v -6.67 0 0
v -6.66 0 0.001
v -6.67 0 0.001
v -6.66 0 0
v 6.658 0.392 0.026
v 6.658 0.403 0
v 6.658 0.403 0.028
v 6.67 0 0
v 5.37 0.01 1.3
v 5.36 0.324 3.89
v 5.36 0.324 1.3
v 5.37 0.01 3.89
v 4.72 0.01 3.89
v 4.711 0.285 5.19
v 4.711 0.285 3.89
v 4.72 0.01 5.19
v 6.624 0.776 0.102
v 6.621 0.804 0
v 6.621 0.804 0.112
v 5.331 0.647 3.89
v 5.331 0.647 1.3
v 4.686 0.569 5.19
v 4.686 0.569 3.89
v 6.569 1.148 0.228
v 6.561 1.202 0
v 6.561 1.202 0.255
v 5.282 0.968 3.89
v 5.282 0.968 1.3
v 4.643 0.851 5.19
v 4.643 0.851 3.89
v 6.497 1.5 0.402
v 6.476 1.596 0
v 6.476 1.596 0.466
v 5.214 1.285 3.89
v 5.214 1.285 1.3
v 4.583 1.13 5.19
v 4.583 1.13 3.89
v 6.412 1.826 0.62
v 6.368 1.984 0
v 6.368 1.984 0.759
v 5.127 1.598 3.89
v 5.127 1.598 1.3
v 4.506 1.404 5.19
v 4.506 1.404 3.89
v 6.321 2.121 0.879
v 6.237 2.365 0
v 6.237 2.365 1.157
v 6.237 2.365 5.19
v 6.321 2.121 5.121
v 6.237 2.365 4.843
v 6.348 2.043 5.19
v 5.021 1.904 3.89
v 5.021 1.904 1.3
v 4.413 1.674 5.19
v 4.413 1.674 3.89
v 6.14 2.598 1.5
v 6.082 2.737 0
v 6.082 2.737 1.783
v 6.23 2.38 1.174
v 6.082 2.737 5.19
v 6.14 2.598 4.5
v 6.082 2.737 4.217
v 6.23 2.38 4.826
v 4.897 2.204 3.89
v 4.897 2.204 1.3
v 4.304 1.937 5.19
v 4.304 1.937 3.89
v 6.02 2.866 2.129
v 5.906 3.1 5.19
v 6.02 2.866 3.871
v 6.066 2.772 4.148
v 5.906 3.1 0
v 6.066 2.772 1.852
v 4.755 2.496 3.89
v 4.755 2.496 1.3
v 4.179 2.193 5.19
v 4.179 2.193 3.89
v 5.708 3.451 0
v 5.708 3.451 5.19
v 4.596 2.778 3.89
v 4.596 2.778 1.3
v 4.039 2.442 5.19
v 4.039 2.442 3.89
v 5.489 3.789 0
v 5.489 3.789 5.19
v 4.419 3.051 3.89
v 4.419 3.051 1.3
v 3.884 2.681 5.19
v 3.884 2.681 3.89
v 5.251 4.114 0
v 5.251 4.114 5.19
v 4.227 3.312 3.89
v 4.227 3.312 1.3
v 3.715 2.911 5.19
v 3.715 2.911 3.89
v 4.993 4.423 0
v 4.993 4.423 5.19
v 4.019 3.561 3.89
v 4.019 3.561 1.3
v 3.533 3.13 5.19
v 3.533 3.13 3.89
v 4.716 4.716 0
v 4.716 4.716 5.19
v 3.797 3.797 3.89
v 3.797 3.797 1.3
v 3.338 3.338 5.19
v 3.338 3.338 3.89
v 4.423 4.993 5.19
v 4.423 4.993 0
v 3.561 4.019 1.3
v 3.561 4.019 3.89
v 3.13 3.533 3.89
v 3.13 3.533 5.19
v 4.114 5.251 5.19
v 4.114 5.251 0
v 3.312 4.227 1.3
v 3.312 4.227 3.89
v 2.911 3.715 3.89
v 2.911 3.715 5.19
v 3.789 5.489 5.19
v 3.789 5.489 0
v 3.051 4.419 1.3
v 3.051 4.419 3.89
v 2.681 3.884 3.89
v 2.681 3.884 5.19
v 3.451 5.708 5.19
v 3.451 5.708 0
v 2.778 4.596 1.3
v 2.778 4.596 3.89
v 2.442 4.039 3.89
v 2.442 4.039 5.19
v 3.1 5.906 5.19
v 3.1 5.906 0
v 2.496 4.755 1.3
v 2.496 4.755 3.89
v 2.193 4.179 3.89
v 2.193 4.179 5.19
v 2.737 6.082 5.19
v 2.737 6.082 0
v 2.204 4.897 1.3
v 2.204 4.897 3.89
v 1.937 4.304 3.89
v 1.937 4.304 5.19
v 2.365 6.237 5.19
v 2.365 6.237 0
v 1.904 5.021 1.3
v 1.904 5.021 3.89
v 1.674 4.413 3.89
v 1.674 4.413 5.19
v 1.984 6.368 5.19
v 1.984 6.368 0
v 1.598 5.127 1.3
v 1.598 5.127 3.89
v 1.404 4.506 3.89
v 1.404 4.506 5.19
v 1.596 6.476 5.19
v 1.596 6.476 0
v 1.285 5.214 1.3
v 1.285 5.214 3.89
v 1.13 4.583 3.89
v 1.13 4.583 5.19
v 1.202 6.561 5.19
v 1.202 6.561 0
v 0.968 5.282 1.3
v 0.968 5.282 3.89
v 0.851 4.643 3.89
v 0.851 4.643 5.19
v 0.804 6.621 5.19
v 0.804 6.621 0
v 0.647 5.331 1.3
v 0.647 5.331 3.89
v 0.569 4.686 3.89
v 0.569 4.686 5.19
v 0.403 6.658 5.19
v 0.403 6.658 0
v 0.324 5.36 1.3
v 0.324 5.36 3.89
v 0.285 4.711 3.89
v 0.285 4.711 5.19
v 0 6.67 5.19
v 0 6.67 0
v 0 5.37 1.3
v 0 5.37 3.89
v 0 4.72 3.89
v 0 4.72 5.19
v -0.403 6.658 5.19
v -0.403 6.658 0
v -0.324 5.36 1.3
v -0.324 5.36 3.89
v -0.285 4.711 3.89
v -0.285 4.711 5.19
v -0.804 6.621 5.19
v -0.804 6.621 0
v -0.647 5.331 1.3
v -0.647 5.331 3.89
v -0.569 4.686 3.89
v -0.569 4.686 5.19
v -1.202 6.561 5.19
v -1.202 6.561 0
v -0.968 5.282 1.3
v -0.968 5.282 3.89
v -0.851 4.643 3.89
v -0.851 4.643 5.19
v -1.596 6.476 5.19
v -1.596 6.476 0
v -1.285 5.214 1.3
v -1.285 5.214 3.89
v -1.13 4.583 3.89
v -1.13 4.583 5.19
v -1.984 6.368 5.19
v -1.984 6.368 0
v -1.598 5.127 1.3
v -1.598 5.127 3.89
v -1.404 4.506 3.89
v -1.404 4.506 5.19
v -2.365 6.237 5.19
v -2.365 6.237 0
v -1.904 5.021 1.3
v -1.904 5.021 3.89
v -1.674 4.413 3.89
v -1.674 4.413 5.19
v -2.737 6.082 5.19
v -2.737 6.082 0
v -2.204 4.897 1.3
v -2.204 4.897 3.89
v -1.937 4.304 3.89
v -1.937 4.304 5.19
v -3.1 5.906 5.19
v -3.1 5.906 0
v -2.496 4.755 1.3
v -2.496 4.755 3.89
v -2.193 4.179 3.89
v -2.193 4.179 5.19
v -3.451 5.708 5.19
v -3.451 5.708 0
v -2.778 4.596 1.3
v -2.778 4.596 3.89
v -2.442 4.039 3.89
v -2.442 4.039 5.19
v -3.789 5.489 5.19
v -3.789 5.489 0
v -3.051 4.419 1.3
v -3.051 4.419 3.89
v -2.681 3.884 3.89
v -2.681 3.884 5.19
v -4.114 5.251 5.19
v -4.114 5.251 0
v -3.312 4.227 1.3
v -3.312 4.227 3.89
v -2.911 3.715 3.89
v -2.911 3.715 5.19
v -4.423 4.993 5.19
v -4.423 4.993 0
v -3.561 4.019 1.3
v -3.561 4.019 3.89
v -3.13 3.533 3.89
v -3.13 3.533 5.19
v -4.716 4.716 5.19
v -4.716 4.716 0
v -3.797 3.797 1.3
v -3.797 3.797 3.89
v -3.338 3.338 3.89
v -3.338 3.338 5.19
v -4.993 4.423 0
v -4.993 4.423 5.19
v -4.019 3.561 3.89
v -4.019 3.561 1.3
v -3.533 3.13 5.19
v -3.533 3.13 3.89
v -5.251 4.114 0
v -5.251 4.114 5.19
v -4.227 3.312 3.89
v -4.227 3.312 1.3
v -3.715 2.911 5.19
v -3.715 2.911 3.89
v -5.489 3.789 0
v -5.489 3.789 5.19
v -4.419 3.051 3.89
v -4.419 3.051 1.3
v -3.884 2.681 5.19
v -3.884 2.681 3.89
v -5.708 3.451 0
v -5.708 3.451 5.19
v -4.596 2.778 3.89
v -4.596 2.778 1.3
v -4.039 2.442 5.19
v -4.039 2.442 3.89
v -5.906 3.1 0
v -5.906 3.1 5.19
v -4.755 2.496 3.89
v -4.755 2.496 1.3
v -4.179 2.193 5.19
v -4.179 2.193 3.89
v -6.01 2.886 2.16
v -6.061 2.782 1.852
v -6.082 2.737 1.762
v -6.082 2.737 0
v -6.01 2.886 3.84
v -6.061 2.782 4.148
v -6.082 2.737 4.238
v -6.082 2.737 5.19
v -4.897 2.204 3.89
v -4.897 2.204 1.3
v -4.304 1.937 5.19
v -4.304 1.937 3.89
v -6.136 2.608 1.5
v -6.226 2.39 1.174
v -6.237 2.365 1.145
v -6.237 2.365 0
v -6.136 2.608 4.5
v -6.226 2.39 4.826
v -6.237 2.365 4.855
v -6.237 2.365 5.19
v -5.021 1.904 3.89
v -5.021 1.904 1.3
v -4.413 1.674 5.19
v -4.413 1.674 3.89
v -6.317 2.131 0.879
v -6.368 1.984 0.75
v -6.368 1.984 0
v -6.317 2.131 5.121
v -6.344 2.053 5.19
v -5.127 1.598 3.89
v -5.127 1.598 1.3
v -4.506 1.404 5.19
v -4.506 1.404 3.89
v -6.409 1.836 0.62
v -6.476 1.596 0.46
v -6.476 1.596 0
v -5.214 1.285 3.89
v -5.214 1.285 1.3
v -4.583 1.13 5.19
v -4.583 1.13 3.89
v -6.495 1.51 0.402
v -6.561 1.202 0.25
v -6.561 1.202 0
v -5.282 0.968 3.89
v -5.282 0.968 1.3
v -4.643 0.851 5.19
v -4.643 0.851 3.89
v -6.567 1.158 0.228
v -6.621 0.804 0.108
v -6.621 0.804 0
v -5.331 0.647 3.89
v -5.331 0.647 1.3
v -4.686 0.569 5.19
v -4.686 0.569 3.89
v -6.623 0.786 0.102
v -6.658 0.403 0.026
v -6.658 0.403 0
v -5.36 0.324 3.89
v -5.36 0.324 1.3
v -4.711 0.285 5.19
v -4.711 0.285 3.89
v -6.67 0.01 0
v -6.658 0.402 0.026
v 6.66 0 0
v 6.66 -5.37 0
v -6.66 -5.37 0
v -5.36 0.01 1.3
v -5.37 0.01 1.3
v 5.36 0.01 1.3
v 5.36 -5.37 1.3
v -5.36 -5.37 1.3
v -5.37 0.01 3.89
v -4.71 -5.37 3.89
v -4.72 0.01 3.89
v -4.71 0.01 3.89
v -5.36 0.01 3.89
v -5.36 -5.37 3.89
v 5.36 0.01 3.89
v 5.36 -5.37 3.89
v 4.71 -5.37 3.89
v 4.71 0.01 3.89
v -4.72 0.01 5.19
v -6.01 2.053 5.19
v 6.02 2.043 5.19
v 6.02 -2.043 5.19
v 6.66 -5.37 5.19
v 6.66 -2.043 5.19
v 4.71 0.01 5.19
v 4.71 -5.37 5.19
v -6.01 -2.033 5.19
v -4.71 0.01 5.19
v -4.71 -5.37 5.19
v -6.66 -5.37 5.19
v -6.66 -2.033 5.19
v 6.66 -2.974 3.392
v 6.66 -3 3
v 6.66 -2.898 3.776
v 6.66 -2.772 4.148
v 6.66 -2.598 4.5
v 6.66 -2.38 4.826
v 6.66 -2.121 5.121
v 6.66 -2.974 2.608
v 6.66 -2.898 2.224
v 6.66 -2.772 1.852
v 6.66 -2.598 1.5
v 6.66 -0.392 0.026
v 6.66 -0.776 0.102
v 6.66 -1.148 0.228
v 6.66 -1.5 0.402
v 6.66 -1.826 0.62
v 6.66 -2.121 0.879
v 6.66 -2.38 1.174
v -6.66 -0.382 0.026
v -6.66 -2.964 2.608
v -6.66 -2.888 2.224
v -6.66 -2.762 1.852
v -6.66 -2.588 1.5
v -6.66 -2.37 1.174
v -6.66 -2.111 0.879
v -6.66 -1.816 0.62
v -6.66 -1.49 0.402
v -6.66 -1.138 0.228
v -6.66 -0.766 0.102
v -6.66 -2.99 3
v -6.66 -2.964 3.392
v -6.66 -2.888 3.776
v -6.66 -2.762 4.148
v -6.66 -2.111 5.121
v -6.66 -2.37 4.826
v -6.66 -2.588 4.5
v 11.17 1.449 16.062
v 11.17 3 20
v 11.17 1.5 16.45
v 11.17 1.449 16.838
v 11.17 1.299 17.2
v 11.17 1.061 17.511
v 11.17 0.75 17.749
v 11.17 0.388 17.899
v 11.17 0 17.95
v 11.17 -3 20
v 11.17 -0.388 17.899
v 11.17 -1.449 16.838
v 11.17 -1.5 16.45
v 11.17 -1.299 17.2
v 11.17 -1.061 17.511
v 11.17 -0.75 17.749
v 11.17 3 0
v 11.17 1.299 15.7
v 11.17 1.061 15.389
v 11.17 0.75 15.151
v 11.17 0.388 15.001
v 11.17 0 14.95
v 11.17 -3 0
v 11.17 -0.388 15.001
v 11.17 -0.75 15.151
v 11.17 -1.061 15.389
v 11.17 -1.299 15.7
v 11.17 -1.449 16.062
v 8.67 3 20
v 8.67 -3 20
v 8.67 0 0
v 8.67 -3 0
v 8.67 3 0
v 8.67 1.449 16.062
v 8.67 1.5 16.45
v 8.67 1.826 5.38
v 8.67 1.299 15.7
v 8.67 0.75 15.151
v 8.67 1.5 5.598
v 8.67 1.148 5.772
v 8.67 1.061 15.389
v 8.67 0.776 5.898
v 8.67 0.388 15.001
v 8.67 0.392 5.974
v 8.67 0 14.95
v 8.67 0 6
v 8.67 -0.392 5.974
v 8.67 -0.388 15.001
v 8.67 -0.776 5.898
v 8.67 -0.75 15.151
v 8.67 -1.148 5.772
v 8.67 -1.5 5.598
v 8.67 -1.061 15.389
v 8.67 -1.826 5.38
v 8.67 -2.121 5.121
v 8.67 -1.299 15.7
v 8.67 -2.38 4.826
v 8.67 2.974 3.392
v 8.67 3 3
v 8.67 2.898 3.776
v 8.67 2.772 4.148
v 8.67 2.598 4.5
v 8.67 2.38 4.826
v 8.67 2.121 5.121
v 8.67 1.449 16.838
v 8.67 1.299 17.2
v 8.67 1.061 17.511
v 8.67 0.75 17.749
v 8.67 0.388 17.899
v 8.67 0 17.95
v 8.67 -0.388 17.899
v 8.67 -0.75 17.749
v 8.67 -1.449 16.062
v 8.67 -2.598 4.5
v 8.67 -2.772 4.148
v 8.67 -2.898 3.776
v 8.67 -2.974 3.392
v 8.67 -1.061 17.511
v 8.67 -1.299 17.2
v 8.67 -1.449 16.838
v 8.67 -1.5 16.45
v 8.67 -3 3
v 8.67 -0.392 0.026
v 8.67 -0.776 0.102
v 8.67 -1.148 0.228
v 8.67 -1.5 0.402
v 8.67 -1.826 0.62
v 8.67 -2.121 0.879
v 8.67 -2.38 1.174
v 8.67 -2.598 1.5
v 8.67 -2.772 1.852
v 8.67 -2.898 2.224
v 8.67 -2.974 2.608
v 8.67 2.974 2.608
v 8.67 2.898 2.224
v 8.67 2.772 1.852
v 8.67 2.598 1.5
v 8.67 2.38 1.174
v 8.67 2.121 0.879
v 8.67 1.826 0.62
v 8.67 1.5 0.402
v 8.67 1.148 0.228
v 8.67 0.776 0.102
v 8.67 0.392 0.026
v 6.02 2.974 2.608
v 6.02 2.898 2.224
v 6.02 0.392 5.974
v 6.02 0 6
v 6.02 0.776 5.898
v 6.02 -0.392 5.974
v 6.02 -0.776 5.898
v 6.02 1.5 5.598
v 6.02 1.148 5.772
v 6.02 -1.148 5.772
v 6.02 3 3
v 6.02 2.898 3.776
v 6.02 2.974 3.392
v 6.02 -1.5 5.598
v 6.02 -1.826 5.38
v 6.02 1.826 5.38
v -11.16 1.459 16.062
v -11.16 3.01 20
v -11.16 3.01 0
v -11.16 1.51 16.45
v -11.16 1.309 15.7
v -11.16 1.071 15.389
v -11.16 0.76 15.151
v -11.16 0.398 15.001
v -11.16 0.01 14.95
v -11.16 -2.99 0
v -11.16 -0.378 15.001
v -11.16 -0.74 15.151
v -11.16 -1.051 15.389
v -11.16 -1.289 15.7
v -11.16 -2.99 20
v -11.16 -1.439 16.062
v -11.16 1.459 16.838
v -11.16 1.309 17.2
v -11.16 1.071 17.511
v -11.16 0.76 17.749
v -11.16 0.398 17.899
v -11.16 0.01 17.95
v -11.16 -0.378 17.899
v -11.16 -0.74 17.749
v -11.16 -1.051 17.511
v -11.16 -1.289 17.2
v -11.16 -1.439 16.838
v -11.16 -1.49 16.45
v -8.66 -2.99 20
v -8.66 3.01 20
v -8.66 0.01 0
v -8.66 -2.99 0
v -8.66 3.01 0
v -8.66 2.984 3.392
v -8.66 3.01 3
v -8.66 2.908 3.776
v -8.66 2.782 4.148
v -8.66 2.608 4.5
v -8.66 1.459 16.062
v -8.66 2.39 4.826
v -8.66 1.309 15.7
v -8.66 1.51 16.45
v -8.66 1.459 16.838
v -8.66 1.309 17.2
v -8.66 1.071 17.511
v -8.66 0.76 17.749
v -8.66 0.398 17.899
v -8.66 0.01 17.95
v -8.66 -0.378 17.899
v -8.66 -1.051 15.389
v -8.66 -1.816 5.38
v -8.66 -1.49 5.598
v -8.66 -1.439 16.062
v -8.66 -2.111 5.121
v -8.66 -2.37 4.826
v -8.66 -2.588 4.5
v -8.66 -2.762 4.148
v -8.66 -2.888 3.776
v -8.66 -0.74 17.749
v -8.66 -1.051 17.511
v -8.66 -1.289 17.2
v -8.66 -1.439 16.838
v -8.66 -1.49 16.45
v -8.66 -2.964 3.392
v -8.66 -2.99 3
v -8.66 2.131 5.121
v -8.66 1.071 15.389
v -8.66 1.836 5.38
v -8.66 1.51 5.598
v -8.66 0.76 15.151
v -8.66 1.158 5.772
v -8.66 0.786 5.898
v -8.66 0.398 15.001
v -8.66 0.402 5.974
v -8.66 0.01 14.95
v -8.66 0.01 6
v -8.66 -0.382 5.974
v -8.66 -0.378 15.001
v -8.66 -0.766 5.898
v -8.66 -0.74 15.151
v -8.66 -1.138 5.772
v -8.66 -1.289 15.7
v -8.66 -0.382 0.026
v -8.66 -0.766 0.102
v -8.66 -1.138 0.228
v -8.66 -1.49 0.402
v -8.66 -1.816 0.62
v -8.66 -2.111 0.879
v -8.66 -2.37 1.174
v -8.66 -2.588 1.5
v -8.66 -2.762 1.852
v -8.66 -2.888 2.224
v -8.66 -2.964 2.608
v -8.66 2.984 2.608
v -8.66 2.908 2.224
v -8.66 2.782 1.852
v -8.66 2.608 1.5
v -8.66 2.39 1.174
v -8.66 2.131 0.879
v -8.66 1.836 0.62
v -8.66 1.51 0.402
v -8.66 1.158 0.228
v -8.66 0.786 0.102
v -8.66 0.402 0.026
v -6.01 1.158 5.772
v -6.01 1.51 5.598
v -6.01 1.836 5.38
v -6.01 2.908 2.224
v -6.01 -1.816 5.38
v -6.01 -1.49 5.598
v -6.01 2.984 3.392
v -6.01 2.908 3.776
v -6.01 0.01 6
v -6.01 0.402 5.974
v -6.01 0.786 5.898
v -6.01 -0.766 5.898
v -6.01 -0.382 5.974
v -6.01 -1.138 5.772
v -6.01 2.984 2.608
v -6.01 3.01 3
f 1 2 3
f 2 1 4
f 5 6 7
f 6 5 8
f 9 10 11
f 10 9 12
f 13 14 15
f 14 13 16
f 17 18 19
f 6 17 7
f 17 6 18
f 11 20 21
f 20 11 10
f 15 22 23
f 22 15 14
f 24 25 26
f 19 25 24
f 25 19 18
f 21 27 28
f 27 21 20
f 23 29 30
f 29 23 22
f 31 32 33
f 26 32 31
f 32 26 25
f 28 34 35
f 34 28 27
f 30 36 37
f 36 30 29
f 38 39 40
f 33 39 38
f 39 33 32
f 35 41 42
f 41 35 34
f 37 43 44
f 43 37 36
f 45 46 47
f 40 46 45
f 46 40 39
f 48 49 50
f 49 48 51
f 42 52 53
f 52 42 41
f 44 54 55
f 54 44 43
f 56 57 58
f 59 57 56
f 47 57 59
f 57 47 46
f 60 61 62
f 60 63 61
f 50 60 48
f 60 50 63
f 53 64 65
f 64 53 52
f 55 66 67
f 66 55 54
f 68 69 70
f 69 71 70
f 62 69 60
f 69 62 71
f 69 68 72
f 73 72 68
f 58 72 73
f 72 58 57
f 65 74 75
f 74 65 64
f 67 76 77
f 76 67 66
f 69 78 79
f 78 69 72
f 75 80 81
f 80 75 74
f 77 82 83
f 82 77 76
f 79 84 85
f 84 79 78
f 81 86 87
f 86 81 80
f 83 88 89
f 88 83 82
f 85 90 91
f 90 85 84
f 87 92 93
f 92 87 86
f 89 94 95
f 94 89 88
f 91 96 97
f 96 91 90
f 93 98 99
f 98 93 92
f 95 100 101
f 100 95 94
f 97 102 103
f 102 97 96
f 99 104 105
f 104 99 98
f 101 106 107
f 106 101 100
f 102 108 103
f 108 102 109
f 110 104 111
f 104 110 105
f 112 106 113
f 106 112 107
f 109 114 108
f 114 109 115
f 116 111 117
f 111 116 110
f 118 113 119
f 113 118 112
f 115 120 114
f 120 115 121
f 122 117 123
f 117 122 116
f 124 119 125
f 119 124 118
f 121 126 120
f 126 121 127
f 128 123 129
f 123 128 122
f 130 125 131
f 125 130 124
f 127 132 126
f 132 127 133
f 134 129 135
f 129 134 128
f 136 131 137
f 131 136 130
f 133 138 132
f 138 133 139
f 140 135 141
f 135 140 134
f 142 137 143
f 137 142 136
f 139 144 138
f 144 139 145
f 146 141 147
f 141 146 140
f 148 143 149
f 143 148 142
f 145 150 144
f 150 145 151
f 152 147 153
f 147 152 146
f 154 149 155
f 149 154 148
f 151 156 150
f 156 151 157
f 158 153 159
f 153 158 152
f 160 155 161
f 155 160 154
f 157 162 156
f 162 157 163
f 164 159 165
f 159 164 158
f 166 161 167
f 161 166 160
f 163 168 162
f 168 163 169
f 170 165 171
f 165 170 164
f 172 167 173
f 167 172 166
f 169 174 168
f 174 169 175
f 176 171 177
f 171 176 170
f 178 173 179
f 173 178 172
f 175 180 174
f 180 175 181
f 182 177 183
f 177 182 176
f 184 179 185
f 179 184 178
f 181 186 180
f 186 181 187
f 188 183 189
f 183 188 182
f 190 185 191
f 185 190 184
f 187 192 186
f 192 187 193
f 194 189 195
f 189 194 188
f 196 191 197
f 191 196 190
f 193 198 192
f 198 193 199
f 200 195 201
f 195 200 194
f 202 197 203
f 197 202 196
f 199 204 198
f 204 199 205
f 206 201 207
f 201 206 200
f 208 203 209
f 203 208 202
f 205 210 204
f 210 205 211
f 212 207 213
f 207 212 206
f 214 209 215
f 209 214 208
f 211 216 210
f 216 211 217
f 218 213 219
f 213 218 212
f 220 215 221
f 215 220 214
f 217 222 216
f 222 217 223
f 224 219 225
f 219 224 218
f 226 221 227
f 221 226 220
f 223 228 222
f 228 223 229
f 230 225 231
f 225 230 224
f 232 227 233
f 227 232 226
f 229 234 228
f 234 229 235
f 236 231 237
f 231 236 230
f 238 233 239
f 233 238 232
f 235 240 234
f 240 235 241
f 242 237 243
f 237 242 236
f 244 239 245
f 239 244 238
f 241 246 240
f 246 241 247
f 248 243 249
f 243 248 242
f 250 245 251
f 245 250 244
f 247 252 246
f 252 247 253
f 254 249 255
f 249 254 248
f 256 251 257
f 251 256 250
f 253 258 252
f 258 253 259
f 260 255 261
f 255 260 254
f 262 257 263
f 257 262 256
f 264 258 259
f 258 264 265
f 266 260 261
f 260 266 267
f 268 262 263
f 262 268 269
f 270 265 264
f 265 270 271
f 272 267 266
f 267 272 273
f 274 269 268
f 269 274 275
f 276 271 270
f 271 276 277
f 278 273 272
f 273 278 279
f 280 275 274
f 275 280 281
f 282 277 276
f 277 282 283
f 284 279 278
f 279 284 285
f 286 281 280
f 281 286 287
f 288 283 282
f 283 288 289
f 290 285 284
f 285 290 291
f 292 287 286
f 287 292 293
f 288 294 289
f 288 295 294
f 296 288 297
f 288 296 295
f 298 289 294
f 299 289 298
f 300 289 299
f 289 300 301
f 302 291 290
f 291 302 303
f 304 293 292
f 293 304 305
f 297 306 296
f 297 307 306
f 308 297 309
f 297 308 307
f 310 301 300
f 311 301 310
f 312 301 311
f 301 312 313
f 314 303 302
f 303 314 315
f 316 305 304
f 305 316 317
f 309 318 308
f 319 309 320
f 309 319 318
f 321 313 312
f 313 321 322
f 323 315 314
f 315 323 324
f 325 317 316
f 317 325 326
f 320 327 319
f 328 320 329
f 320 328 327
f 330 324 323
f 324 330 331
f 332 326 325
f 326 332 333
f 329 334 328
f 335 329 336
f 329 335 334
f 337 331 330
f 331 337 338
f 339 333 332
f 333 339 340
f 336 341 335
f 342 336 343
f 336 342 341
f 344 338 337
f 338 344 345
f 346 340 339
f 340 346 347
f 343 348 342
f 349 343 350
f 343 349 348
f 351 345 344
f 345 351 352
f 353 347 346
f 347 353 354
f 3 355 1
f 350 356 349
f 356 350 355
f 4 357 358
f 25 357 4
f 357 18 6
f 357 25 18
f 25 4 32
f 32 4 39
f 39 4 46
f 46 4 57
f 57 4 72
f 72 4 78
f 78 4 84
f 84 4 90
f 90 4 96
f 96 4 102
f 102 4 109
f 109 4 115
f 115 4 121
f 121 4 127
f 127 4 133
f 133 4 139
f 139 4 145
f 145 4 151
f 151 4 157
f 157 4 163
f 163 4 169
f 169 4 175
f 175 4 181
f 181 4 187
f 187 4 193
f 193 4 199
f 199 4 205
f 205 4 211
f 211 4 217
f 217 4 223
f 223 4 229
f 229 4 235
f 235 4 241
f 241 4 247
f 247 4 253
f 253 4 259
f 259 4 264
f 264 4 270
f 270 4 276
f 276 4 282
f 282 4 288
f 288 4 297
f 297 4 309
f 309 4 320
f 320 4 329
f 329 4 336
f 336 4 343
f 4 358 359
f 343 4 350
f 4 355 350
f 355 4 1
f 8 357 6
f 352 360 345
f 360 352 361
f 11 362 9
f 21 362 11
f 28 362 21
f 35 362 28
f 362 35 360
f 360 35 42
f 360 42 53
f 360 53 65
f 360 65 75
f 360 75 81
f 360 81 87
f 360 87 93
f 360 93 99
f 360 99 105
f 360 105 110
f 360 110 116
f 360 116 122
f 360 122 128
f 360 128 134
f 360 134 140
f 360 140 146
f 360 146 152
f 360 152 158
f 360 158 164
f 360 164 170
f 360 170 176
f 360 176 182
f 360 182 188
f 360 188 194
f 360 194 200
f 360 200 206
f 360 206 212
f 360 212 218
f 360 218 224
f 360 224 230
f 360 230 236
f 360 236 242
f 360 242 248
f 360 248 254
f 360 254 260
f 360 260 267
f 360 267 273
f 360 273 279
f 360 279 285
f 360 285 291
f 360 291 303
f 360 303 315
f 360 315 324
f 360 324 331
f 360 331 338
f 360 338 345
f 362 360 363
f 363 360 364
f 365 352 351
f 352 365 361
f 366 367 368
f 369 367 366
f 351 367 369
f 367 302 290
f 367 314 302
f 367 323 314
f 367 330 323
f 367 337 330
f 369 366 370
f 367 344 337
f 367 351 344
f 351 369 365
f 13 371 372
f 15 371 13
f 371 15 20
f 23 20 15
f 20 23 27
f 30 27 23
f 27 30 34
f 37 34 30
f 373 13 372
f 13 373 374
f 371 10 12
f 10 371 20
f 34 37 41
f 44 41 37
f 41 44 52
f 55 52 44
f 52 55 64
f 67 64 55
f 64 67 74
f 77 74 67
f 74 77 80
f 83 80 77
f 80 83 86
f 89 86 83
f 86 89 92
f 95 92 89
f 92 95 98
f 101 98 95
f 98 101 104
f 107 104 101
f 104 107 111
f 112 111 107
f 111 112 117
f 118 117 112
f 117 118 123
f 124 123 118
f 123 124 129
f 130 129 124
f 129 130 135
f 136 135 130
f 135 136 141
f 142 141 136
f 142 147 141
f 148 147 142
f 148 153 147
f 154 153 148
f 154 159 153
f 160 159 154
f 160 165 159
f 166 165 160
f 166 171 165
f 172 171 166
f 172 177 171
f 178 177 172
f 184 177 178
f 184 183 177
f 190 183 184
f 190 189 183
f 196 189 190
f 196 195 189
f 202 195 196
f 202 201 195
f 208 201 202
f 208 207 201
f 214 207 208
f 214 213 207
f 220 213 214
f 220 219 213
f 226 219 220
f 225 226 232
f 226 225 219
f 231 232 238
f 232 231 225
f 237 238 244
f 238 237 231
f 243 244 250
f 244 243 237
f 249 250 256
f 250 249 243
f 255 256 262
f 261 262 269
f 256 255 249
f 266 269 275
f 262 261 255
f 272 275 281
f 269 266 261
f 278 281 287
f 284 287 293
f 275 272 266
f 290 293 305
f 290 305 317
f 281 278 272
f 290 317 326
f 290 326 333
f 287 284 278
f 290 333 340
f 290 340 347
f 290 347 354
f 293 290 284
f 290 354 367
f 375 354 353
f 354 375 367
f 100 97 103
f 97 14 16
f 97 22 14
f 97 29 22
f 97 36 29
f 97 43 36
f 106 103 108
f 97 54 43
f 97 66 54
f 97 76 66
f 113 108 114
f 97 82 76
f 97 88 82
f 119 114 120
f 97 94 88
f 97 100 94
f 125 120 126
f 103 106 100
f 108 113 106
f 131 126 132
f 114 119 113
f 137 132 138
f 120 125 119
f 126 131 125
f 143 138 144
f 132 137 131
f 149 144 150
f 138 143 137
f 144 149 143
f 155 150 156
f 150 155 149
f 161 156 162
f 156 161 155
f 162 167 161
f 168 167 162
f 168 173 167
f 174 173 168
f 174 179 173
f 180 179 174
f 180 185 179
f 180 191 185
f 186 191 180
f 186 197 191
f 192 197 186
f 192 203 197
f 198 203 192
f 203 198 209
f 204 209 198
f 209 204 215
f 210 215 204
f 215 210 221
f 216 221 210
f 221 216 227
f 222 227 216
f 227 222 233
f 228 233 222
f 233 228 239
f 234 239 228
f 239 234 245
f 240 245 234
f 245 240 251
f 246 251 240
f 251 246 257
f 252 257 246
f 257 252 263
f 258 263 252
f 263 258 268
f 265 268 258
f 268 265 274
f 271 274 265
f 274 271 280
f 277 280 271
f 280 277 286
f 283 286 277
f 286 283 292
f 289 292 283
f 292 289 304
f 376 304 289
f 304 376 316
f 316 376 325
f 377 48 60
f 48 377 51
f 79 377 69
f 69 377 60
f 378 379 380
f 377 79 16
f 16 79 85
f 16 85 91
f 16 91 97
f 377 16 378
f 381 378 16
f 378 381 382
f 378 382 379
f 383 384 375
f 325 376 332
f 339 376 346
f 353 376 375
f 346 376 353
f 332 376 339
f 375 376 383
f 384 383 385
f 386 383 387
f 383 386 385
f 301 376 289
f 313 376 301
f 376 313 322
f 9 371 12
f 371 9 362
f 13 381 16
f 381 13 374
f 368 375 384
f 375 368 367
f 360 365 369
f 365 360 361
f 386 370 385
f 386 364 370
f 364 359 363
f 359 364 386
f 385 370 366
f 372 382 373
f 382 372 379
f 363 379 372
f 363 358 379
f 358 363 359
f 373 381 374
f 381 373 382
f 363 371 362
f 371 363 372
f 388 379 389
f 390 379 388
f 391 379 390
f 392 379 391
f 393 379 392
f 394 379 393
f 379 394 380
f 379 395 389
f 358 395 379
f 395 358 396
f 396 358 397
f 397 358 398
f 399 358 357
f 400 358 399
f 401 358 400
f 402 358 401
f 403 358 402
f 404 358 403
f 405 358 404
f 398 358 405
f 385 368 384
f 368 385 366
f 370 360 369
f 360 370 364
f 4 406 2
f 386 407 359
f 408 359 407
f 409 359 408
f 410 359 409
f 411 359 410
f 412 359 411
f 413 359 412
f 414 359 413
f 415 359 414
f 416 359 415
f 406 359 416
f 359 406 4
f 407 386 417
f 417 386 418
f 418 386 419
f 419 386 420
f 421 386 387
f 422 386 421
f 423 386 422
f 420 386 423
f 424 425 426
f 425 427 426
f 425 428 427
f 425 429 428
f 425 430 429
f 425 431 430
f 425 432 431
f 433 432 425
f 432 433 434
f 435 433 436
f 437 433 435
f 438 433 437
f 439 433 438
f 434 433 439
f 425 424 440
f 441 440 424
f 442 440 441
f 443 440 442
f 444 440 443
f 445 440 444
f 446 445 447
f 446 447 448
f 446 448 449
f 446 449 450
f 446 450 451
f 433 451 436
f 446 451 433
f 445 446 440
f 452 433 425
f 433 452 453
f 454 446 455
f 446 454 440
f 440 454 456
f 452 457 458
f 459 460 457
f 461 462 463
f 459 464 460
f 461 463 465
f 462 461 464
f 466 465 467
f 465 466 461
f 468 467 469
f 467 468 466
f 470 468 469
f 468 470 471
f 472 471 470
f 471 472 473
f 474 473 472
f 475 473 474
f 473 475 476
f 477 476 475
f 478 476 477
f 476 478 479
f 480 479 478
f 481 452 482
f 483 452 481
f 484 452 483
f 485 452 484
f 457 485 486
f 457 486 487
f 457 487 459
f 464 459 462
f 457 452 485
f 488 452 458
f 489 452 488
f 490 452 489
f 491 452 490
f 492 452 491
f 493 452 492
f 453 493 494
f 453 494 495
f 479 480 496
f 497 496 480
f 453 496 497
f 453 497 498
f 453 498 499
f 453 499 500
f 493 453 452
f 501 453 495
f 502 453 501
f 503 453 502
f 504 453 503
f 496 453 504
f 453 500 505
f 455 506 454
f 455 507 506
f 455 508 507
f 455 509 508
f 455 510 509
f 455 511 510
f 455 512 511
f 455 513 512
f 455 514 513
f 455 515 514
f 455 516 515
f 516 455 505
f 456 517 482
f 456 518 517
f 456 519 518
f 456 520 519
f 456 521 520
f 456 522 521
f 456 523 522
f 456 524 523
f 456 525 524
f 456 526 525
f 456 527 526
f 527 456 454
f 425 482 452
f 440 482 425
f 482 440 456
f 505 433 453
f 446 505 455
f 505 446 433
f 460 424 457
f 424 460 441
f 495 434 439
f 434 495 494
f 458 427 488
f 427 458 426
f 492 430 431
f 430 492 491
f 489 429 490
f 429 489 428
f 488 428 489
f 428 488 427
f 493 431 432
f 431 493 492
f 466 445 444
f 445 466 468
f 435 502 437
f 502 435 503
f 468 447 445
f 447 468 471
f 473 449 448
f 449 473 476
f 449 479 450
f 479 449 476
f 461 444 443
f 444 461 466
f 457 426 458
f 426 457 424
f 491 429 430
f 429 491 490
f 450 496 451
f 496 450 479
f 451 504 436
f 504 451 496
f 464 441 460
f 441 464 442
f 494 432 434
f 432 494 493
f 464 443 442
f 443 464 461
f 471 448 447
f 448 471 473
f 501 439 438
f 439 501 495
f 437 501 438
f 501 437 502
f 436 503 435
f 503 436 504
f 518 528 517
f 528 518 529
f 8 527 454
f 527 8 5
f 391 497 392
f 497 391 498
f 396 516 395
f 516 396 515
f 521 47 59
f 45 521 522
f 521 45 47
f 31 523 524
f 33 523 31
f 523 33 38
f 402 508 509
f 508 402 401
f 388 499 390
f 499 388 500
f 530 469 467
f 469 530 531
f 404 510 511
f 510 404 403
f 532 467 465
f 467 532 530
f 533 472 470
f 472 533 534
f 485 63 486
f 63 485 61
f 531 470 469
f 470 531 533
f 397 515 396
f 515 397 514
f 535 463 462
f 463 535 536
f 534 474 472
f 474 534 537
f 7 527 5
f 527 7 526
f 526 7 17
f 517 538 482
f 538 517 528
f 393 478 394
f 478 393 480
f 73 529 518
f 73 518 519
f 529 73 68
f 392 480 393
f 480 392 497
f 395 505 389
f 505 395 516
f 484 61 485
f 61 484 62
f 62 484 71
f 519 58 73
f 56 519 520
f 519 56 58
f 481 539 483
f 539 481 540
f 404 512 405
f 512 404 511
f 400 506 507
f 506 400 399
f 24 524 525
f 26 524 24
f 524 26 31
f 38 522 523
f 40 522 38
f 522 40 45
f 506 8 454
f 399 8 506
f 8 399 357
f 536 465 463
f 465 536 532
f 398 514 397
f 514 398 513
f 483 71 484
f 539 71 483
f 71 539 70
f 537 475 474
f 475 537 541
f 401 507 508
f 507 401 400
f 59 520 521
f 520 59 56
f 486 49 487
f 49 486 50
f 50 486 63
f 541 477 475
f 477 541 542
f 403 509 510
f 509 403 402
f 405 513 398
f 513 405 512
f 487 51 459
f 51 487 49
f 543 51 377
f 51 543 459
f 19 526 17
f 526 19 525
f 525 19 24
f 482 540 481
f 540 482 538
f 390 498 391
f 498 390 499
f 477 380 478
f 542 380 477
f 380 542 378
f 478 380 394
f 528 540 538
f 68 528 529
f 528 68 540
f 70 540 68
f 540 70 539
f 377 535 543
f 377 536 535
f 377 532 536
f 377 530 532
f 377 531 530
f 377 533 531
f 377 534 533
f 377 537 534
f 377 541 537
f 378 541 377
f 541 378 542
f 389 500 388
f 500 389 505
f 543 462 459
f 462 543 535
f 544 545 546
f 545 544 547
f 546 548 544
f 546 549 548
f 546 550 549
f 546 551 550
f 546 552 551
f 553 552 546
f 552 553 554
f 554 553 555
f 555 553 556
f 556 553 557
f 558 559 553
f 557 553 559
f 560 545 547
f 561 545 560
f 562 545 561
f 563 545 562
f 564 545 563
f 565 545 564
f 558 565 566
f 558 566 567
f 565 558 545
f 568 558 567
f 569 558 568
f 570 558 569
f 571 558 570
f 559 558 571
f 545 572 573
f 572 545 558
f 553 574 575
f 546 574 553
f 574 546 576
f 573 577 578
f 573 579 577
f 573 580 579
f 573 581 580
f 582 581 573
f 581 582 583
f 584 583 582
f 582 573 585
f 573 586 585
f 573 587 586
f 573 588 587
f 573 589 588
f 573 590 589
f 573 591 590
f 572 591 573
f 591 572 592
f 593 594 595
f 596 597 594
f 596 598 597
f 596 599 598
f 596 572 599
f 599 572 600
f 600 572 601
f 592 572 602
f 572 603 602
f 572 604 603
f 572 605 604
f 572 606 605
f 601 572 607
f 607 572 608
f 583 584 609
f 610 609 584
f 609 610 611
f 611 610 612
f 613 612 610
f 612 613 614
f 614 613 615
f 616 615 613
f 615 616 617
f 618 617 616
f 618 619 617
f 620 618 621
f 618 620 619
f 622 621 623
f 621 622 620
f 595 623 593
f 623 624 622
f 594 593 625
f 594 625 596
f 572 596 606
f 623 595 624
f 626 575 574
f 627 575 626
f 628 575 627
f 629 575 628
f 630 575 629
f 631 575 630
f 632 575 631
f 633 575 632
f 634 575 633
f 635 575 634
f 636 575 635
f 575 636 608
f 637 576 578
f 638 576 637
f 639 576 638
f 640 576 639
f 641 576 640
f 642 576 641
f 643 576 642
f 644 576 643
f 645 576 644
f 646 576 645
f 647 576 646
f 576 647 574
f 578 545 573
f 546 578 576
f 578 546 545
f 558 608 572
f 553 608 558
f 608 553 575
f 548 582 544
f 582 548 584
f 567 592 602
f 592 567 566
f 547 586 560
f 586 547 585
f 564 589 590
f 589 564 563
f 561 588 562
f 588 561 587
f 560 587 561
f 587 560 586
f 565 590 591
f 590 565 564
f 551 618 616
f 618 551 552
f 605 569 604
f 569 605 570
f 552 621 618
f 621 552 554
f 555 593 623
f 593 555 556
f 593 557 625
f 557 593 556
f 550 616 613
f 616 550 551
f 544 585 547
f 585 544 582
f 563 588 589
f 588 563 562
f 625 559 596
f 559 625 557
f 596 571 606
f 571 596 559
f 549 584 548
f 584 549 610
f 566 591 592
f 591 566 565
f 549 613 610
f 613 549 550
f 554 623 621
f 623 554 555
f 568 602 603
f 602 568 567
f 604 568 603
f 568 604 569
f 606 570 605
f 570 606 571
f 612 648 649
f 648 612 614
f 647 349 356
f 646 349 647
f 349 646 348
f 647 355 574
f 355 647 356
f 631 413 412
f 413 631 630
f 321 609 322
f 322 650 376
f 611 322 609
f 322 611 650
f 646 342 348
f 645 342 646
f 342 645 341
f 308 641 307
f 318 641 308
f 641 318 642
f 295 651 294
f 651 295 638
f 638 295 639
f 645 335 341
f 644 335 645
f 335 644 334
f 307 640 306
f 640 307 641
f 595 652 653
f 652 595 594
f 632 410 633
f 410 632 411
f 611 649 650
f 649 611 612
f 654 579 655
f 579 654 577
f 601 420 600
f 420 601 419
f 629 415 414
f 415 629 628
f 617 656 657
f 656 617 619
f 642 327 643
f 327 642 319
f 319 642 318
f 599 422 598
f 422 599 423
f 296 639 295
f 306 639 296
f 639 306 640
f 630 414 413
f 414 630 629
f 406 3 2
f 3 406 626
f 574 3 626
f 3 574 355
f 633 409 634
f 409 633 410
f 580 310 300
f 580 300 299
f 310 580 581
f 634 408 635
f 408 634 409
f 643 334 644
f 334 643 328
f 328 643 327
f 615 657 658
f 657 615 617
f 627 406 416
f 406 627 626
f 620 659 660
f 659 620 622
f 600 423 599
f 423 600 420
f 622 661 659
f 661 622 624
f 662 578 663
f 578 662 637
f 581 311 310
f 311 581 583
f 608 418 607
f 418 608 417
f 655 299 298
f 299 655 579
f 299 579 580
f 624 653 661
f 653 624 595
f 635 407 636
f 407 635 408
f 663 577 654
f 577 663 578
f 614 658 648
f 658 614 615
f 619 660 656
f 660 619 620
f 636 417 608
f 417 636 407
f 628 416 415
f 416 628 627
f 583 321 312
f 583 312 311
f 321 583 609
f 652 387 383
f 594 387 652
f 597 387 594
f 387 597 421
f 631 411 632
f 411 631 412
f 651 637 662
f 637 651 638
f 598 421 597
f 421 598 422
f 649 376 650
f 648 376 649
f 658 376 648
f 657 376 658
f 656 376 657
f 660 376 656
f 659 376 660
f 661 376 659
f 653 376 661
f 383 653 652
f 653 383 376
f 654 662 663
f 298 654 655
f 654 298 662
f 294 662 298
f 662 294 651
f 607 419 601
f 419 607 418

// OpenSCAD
$fa = 1;
$fs = 0.4;

// All dimensions in mm
eps = 0.01;
pad_diameter = 10.74;
pad_height = 2.60;
rotation_pivot_diameter = 6;
lip_dr_scale = 0.25; // lose (0.375 is tight)
air_slider_length = 20;
air_slider_width = rotation_pivot_diameter;  // long enough to figure out where pivot is!
air_slider_depth = 2.5;
axle_length = 2; // Must be sufficent to allow latching on and to clear barrel!

pin_offset = 16.45;
pin_hole_diameter = 3;

module catch_profile(pad_diameter, pad_height) {
    r_pd = pad_diameter/2;
    rim_dr = 0.5*pad_height;
    cap_dz = 0.5*pad_height;
    lip_dz = 0.5*pad_height;
    lip_dr = lip_dr_scale * pad_height;
    
    // Patch (slightly oversized) 
    square(size = [r_pd + eps, cap_dz], center = false); 
    // Annulus 
    translate([r_pd, 0, 0]) square(size = [rim_dr, pad_height+cap_dz], center = false);
    // Lip
    color("red") translate([r_pd - lip_dr, pad_height+cap_dz-eps, 0]) square(size = [lip_dr+rim_dr, lip_dz], center = false);
       
}

module half_slide(pad_diameter, pad_height, length) {
    linear_extrude(height=length, center=false, convexity = 10, twist = 0) catch_profile(pad_diameter, pad_height); 
}


*half_slide(pad_diameter, pad_height, length=10);

module pin() {
    dz = pin_offset;
    translate([0, 0, dz]) rotate([0, 90, 0]) cylinder(h=40, d=pin_hole_diameter, center=true);
}

module half_air_slider() {
    cap_dz = 0.5*pad_height;
    // axle
    dx_a = axle_length + cap_dz;
    x_a = dx_a/2 + pad_diameter/2 + 0.5*cap_dz;
    translate([x_a, 0, rotation_pivot_diameter/2]) pivot_drill(dx_a, rotation_pivot_diameter);
    // slider

    dx_s = pad_diameter/2 + dx_a;
    difference() {
        translate([dx_s, -air_slider_width/2, 0]) cube([air_slider_depth,air_slider_width,air_slider_length], center=false);
        pin();
    }

    
}

module base_trigger_catch(pad_diameter, pad_height) {
    // Cap
    rotate_extrude(angle = 180, convexity = 2) catch_profile(pad_diameter, pad_height);
    length = 0.5 * pad_diameter+eps;
    translate([-eps, eps, 0])  rotate([90,0,0]) half_slide(pad_diameter, pad_height, length);   
    mirror([eps,0,0]) translate([-eps, eps, 0]) rotate([90,0,0]) half_slide(pad_diameter, pad_height, length);
}

module pivot_drill(length, diameter) {
    // Hole for attaching yoke
    rotate([0, 90, 0]) cylinder(h=length, d=diameter, center=true);
}

module trigger_catch(pad_diameter, pad_height) {
    
    base_trigger_catch(pad_diameter, pad_height);
    half_air_slider();
    mirror([eps,0,0]) translate([-eps, eps, 0]) half_air_slider();

}

trigger_catch(pad_diameter, pad_height);
* translate([0, 10, 0]) trigger_catch(pad_diameter, pad_height);

module yoke_half() {

    // catch_clearance = 2;
    catch_clearance = 1;
    catch_depth = 0.45*pad_height;
    pivot_length = catch_clearance + catch_depth;
    pivot_clearance = 0.5;
    g = rotation_pivot_diameter-pivot_clearance;
    yoke_depth = 20;
    
    // cross bar
    lip_dr = lip_dr_scale * pad_height;
    cbl = pad_diameter/2 + catch_clearance + lip_dr;
    translate([0, yoke_depth-g/2, 0])  cube([cbl+eps,g,g], center=false);
    //side bar of yoke
    translate([cbl, -g/2, 0])  cube([g+eps,g+yoke_depth,g], center=false);
    
    translate ([cbl - pivot_length/2, 0, g/2]) pivot_drill(pivot_length+eps, g);
}

module yoke() {
    yoke_half(); 
    mirror([1, 0, 0]) yoke_half();   
}

* yoke();
